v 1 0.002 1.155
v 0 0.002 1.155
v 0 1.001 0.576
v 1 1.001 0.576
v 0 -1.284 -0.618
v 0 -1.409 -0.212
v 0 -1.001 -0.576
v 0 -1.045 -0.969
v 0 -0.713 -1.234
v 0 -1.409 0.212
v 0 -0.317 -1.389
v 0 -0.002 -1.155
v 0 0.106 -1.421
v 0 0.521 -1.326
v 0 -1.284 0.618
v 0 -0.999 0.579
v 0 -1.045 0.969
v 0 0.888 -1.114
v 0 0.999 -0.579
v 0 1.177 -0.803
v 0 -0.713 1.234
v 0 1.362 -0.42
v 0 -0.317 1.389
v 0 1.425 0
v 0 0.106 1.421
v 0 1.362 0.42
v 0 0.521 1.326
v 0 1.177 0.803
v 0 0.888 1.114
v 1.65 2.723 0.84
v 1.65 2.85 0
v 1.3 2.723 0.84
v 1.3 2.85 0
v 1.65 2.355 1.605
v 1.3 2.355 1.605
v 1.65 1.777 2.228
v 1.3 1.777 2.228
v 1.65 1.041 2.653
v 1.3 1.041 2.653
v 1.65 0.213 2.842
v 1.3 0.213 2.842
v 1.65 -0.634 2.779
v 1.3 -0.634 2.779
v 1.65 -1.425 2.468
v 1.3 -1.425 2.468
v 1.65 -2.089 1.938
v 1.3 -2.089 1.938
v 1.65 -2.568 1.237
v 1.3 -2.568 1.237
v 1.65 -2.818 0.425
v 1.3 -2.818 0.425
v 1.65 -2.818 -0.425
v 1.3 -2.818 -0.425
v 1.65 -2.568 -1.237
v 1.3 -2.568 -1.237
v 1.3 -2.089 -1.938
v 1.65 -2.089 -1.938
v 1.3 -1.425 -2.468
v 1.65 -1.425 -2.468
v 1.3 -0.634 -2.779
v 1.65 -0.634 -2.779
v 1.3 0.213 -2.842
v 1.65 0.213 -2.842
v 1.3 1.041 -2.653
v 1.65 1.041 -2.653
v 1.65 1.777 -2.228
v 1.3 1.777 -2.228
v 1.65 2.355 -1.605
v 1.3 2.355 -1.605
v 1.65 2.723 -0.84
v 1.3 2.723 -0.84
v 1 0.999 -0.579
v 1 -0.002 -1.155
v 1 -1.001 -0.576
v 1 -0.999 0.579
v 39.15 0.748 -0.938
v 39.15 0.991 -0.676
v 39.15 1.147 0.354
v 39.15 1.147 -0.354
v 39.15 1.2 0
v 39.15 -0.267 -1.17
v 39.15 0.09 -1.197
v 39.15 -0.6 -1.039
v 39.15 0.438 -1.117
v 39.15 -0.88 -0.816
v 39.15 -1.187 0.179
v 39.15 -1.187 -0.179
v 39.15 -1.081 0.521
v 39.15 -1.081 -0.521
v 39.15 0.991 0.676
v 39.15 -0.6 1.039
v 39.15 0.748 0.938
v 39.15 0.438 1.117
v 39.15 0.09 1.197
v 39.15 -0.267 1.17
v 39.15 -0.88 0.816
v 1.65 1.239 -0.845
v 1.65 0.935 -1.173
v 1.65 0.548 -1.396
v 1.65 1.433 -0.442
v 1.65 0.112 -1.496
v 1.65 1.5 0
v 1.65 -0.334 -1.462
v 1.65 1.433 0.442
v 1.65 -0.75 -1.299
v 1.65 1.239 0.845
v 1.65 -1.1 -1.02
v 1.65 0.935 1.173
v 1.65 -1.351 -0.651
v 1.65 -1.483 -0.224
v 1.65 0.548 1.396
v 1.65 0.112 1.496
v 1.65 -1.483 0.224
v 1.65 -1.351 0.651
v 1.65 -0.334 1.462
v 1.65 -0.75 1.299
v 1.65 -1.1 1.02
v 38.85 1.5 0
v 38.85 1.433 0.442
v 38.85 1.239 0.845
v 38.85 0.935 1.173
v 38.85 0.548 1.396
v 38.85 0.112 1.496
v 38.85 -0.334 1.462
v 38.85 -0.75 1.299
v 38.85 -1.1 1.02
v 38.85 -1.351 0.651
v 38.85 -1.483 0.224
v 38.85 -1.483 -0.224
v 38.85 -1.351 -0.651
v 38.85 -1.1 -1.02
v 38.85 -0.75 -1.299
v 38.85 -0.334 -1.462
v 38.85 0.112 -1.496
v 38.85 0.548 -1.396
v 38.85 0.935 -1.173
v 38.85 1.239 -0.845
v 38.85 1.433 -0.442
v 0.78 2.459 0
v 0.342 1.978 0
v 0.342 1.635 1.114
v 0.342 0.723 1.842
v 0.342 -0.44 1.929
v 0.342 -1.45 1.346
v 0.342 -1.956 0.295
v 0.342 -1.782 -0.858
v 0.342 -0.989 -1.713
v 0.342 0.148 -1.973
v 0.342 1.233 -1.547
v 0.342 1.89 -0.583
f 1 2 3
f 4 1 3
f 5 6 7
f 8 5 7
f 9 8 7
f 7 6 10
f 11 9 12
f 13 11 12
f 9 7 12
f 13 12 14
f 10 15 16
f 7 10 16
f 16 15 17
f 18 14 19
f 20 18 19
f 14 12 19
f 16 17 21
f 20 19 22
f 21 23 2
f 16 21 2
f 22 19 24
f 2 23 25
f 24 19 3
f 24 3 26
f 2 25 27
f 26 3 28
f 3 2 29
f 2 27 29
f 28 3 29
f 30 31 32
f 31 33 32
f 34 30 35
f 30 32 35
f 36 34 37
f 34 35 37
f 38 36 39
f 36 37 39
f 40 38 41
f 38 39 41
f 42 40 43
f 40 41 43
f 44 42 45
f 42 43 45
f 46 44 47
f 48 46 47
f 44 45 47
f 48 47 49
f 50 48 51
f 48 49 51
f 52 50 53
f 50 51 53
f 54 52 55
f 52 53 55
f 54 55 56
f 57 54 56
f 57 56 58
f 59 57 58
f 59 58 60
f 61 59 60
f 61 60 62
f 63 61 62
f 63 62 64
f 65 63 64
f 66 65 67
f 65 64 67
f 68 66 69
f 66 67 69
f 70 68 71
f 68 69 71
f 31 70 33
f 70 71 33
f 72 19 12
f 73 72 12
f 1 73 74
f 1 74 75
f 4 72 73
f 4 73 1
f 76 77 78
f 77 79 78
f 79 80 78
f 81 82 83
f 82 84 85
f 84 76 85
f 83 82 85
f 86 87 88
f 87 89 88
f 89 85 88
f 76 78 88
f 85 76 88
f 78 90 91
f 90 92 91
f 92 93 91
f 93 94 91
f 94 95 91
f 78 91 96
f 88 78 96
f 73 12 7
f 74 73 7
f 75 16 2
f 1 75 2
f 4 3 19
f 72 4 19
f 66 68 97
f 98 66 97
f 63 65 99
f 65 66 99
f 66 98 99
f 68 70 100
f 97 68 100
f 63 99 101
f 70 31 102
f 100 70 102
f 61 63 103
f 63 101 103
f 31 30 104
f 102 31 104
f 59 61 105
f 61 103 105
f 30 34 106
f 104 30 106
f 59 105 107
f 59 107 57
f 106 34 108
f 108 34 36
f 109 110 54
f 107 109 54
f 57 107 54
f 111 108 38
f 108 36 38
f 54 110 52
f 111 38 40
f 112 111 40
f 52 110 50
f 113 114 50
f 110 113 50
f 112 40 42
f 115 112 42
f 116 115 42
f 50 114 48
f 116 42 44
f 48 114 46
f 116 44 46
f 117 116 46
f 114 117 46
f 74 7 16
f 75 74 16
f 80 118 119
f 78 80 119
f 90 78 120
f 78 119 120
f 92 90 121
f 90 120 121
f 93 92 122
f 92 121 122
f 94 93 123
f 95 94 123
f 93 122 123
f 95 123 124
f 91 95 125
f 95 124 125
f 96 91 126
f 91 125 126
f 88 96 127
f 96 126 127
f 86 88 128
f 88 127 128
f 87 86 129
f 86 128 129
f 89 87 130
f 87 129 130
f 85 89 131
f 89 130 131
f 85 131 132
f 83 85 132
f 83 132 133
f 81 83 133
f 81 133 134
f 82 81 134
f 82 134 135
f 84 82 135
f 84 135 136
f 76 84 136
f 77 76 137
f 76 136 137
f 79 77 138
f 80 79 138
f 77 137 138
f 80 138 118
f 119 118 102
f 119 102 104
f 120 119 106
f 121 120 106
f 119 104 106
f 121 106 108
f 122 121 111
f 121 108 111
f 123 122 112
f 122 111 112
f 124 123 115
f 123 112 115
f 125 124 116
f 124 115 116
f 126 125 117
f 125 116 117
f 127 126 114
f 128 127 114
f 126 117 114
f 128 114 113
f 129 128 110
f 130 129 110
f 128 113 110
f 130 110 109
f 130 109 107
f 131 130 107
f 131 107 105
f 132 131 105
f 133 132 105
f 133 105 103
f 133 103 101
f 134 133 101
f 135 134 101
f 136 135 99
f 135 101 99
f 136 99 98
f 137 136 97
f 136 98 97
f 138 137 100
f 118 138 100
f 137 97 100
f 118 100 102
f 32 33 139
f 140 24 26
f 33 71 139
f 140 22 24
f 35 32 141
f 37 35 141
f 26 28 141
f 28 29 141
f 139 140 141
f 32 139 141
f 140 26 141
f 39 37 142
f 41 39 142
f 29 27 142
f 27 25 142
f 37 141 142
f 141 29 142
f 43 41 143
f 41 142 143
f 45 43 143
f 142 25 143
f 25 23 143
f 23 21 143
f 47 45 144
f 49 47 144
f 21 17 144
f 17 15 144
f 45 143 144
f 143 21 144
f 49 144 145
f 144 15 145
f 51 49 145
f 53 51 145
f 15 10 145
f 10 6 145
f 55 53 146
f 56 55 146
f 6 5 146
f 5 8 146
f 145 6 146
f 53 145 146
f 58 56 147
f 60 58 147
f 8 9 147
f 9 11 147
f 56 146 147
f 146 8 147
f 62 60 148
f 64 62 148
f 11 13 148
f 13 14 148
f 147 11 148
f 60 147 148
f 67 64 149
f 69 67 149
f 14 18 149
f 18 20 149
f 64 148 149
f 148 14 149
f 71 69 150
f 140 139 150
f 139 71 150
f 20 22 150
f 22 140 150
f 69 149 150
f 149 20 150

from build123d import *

# Parameters (mm, degrees)
CHAMFER1_SIZE      = 0.3
CUT_EXTRUDE1_DEPTH = 1


with BuildPart() as part:
    # Sketch2 → Revolve1 (revolve)
    with BuildSketch(Plane.XY):
        with BuildLine():
            Line((0, 0), (39.15, 0))
            Line((39.15, 0), (39.15, 1.5))
            Line((39.15, 1.5), (1.65, 1.5))
            Line((1.65, 1.5), (1.65, 2.85))
            Line((1.65, 2.85), (1.3, 2.85))
            ThreePointArc((1.3, 2.85), (0.549895392, 2.228823502), (0, 1.425))
            Line((0, 1.425), (0, 0))
        make_face()
    revolve(axis=Axis((0, 0, 0), (1, 0, 0)))

    # Chamfer1
    chamfer1_edges = [part.edges().sort_by_distance(p)[0] for p in [
        (39.15, -1.5, 0),
    ]]
    chamfer(chamfer1_edges, length=CHAMFER1_SIZE)

    # Sketch3 → Cut-Extrude1 (cut)
    with BuildSketch(Plane.ZY):
        Polygon((0.576043408, 1.000753379), (-0.578656145, 0.999244915), (-1.154699553, -0.001508464), (-0.576043408, -1.000753379), (0.578656145, -0.999244915), (1.154699553, 0.001508464), align=None)
    extrude(amount=-CUT_EXTRUDE1_DEPTH, mode=Mode.SUBTRACT)


solid = part.part
